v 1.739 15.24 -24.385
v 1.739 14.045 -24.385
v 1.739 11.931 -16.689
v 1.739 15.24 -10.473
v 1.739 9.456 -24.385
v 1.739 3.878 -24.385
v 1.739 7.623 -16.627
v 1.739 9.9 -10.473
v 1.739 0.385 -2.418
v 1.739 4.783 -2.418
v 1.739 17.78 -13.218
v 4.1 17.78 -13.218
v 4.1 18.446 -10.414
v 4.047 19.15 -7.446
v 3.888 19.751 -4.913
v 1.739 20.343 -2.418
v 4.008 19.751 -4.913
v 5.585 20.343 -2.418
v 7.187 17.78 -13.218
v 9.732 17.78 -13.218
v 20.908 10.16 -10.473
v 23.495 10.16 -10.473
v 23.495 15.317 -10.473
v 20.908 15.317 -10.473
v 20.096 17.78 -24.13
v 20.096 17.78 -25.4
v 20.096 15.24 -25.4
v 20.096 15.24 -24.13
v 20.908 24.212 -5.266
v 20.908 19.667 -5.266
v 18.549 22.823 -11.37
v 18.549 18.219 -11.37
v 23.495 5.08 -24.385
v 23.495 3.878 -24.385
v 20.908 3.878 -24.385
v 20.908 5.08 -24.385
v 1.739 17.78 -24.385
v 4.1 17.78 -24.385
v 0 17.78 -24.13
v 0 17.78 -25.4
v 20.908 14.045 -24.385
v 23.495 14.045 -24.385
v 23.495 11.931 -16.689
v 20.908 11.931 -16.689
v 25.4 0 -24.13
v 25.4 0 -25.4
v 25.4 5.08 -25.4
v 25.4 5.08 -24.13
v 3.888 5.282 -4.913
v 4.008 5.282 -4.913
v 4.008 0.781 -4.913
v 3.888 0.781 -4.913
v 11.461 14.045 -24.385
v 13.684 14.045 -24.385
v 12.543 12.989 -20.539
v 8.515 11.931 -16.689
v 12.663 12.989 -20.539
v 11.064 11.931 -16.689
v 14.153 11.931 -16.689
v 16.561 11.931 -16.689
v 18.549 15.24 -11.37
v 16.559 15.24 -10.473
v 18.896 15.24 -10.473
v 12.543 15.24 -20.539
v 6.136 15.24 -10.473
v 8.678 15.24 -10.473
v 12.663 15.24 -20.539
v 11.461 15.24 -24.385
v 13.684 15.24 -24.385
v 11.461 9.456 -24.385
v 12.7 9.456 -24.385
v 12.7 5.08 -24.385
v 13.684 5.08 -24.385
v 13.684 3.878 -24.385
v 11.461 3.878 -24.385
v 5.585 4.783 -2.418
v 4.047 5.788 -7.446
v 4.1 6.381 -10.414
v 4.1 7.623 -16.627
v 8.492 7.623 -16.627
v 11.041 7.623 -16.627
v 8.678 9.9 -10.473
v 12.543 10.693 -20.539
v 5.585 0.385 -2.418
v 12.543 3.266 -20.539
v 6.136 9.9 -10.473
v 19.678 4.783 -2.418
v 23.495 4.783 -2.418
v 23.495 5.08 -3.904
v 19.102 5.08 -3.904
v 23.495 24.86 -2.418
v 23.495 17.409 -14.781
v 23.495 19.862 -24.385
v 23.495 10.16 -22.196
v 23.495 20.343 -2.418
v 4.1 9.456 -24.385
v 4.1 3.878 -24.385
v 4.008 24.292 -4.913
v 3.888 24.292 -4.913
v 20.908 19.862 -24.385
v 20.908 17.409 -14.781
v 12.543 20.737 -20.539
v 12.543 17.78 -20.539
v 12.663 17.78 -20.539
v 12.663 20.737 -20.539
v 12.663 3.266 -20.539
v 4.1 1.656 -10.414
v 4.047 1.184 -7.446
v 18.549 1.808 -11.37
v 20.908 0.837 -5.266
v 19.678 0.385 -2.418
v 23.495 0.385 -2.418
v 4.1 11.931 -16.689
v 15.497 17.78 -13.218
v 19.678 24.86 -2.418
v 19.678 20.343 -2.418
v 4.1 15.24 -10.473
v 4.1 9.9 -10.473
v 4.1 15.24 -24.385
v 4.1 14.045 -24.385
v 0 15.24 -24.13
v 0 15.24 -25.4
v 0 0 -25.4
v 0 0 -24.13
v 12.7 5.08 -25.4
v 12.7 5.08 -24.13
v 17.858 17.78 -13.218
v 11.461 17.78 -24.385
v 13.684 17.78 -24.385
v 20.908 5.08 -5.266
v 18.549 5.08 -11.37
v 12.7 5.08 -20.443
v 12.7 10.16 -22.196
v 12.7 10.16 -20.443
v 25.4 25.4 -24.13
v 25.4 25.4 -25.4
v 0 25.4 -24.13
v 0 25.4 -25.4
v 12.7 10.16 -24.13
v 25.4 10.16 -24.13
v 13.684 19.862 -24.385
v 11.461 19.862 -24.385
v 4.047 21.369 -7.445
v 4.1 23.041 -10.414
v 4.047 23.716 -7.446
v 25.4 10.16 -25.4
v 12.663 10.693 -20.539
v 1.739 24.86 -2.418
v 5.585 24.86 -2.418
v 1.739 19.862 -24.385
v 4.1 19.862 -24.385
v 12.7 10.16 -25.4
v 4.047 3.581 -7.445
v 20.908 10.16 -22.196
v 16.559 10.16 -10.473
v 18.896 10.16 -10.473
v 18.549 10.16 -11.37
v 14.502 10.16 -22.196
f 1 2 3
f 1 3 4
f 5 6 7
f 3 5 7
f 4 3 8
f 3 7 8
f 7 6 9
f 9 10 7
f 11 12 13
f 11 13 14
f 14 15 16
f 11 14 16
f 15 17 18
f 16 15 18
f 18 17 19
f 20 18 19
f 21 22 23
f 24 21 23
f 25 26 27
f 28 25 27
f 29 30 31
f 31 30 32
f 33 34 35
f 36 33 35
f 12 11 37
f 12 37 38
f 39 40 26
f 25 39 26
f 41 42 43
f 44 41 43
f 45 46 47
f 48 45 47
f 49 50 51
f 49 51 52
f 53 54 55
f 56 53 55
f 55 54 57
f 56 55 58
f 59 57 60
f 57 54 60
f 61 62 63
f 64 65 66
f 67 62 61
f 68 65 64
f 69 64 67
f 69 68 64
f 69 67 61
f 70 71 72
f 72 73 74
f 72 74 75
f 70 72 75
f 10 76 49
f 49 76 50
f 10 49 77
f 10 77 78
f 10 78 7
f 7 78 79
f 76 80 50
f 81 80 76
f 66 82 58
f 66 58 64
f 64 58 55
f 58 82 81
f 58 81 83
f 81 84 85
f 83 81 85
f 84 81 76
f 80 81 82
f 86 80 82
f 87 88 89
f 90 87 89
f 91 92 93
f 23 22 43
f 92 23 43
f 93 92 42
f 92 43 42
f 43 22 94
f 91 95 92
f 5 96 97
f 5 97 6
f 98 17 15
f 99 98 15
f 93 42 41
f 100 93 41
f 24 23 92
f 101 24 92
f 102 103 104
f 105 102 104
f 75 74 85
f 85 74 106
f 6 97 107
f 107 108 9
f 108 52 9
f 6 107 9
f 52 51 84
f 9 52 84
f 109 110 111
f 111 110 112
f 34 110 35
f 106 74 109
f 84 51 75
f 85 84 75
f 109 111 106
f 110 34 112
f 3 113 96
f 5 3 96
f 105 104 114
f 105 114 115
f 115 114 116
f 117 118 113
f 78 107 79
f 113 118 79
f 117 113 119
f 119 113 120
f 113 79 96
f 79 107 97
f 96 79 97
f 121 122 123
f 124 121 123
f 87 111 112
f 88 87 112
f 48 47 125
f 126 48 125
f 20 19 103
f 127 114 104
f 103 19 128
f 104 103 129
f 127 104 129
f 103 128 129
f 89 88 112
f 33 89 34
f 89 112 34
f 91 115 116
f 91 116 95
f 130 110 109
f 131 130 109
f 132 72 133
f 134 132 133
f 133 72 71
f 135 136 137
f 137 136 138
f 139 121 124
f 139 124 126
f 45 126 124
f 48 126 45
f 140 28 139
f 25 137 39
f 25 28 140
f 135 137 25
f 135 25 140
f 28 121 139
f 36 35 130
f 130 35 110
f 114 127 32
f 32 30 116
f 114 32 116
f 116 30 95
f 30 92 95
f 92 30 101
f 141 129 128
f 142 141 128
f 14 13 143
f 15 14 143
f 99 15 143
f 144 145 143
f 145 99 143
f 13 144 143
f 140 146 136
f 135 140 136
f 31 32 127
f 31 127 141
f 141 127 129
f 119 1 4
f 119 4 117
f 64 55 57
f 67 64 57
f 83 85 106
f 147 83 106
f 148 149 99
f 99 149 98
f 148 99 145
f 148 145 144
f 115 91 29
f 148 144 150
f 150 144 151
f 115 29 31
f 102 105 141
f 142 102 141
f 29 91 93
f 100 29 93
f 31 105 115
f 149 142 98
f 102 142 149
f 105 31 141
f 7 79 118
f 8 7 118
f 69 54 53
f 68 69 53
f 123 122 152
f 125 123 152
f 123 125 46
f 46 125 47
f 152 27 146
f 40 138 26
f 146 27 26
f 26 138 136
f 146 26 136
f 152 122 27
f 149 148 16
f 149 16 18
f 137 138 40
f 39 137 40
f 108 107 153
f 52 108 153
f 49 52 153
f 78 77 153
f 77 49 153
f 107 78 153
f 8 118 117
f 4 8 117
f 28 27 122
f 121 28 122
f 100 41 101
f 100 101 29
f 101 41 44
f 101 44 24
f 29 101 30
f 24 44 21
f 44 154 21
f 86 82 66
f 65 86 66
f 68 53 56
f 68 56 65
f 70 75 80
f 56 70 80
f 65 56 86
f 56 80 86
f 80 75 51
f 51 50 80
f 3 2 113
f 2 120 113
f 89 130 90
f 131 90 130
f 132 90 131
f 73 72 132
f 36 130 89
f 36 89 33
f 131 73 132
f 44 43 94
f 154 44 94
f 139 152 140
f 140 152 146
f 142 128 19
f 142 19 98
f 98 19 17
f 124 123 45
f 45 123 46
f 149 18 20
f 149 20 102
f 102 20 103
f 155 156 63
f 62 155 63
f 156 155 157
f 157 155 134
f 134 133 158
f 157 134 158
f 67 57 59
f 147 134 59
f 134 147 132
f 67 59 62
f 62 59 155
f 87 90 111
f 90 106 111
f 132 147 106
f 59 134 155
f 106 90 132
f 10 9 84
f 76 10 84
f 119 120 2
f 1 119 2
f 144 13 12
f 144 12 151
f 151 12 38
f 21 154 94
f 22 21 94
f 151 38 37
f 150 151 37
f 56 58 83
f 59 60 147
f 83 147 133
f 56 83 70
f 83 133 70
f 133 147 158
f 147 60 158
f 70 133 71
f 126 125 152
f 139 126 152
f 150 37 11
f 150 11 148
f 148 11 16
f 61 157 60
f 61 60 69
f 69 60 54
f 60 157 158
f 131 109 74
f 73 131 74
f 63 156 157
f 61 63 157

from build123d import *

# Parameters (mm, degrees)
F0_W      = 25.4
F0_H      = 25.4
F1_DEPTH  = 25.4
F4_DEPTH  = 38.1
F6_DEPTH  = 25.4
F8_W      = 20.0962815434
F8_H      = 2.54
F8_W_2    = 12.7
F8_H_2    = 5.08
F9_DEPTH  = 25.4
F10_DEPTH = 1.27


with BuildPart() as f1:
    # F0 (on Right) → F1 (new body)
    with BuildSketch(Plane.YZ):
        with Locations((12.7, -12.7)):
            Rectangle(F0_W, F0_H)
    extrude(amount=F1_DEPTH)

    # F3 (on offset) → F4 (cut)
    with BuildSketch(Plane.YZ.offset(25.4)):
        Polygon((20.91720514, 0), (4.2997440323, 0), (7.6232361607, -16.6274663061), (9.9004441872, -10.4728508741), (15.3165059164, -10.4728508741), (17.4090750515, -14.781082049), align=None)
        Polygon((11.93146687, -16.6890118271), (9.1201418885, -25.4285670817), (14.3317673355, -25.4285670817), align=None)
        Polygon((25.4100747406, -25.4285670817), (25.4100747406, 0), (19.62473616, -25.4285670817), align=None)
        Polygon((4.0437718923, -25.4285670817), (0, 0), (0, -25.4285670817), align=None)
    extrude(amount=-F4_DEPTH, mode=Mode.SUBTRACT)

    # F5 (on Front) → F6 (cut)
    with BuildSketch(Plane.XZ):
        Polygon((5.5881491862, 0), (0, 0), (0, -25.4), (21.59, -25.4), (25.4, -25.4), (25.4, 0), (20.7322615659, 0), align=None)
        Polygon((1.7391315953, -24.3853386492), (1.7391315953, -19.2400895268), (1.7391315953, -2.4179214688), (5.5854729707, -2.4179214688), (12.5425429335, -20.5389972737), (12.6627411015, -20.5389972737), (19.6775061849, -2.4179214688), (23.495, -2.4179214688), (23.495, -24.3853386492), (20.9419909121, -24.3853386492), (20.9080148488, -24.3853386492), (13.6837447062, -24.3853386492), (13.5185520575, -24.3853386492), (11.4607594217, -24.3853386492), (11.1073768078, -24.3853386492), (4.0998236145, -24.3853386492), (3.7612516899, -24.3853386492), (1.7593456432, -24.3853386492), align=None, mode=Mode.SUBTRACT)
        Polygon((12.5522324815, -20.2039610595), (5.7631577365, -2.2304123268), (19.6024235338, -2.2304123268), align=None, mode=Mode.SUBTRACT)
        Polygon((19.6024235338, -2.2304123268), (5.7631577365, -2.2304123268), (12.5522324815, -20.2039610595), align=None)
        with BuildLine():
            Line((4.0998236145, -10.413503603), (4.0998236145, -24.3853386492))
            Line((4.0998236145, -24.3853386492), (11.1073768078, -24.3853386492))
            Line((11.1073768078, -24.3853386492), (11.4607594217, -24.3853386492))
            Line((11.4607594217, -24.3853386492), (4.0084730068, -4.9132354361))
            Line((4.0084730068, -4.9132354361), (3.8882748388, -4.9132354361))
            add(Edge.make_bspline(
                [(3.8882748388, -4.9132354361), (4.0998236145, -7.2258481881), (4.0998236145, -10.413503603)],
                knots=[0, 0, 0, 1, 1, 1], degree=2))
        make_face()
        Polygon((18.5489627532, -11.3699958127), (13.6837447062, -24.3853386492), (20.9080148488, -24.3853386492), (20.9080148488, -5.2663447092), align=None)
    extrude(amount=-F6_DEPTH, mode=Mode.SUBTRACT)

    # F8 (on offset) → F9 (cut)
    with BuildSketch(Plane.XY.offset(-25.4)):
        with Locations((10.0481407717, 16.51)):
            Rectangle(F8_W, F8_H)
        with Locations((19.05, 7.62)):
            Rectangle(F8_W_2, F8_H_2)
    extrude(amount=F9_DEPTH, mode=Mode.SUBTRACT)


with BuildPart() as f10:
    # F8 (on offset) → F10 (new body)
    with BuildSketch(Plane.XY.offset(-25.4)):
        Polygon((0, 15.24), (0, 0), (25.4, 0), (25.4, 5.08), (12.7, 5.08), (12.7, 10.16), (25.4, 10.16), (25.4, 25.4), (0.9083829937, 25.4), (0, 25.4), (0, 17.78), (20.0962815434, 17.78), (20.0962815434, 15.24), align=None)
    extrude(amount=F10_DEPTH)


solid = Compound([f1.part, f10.part])
